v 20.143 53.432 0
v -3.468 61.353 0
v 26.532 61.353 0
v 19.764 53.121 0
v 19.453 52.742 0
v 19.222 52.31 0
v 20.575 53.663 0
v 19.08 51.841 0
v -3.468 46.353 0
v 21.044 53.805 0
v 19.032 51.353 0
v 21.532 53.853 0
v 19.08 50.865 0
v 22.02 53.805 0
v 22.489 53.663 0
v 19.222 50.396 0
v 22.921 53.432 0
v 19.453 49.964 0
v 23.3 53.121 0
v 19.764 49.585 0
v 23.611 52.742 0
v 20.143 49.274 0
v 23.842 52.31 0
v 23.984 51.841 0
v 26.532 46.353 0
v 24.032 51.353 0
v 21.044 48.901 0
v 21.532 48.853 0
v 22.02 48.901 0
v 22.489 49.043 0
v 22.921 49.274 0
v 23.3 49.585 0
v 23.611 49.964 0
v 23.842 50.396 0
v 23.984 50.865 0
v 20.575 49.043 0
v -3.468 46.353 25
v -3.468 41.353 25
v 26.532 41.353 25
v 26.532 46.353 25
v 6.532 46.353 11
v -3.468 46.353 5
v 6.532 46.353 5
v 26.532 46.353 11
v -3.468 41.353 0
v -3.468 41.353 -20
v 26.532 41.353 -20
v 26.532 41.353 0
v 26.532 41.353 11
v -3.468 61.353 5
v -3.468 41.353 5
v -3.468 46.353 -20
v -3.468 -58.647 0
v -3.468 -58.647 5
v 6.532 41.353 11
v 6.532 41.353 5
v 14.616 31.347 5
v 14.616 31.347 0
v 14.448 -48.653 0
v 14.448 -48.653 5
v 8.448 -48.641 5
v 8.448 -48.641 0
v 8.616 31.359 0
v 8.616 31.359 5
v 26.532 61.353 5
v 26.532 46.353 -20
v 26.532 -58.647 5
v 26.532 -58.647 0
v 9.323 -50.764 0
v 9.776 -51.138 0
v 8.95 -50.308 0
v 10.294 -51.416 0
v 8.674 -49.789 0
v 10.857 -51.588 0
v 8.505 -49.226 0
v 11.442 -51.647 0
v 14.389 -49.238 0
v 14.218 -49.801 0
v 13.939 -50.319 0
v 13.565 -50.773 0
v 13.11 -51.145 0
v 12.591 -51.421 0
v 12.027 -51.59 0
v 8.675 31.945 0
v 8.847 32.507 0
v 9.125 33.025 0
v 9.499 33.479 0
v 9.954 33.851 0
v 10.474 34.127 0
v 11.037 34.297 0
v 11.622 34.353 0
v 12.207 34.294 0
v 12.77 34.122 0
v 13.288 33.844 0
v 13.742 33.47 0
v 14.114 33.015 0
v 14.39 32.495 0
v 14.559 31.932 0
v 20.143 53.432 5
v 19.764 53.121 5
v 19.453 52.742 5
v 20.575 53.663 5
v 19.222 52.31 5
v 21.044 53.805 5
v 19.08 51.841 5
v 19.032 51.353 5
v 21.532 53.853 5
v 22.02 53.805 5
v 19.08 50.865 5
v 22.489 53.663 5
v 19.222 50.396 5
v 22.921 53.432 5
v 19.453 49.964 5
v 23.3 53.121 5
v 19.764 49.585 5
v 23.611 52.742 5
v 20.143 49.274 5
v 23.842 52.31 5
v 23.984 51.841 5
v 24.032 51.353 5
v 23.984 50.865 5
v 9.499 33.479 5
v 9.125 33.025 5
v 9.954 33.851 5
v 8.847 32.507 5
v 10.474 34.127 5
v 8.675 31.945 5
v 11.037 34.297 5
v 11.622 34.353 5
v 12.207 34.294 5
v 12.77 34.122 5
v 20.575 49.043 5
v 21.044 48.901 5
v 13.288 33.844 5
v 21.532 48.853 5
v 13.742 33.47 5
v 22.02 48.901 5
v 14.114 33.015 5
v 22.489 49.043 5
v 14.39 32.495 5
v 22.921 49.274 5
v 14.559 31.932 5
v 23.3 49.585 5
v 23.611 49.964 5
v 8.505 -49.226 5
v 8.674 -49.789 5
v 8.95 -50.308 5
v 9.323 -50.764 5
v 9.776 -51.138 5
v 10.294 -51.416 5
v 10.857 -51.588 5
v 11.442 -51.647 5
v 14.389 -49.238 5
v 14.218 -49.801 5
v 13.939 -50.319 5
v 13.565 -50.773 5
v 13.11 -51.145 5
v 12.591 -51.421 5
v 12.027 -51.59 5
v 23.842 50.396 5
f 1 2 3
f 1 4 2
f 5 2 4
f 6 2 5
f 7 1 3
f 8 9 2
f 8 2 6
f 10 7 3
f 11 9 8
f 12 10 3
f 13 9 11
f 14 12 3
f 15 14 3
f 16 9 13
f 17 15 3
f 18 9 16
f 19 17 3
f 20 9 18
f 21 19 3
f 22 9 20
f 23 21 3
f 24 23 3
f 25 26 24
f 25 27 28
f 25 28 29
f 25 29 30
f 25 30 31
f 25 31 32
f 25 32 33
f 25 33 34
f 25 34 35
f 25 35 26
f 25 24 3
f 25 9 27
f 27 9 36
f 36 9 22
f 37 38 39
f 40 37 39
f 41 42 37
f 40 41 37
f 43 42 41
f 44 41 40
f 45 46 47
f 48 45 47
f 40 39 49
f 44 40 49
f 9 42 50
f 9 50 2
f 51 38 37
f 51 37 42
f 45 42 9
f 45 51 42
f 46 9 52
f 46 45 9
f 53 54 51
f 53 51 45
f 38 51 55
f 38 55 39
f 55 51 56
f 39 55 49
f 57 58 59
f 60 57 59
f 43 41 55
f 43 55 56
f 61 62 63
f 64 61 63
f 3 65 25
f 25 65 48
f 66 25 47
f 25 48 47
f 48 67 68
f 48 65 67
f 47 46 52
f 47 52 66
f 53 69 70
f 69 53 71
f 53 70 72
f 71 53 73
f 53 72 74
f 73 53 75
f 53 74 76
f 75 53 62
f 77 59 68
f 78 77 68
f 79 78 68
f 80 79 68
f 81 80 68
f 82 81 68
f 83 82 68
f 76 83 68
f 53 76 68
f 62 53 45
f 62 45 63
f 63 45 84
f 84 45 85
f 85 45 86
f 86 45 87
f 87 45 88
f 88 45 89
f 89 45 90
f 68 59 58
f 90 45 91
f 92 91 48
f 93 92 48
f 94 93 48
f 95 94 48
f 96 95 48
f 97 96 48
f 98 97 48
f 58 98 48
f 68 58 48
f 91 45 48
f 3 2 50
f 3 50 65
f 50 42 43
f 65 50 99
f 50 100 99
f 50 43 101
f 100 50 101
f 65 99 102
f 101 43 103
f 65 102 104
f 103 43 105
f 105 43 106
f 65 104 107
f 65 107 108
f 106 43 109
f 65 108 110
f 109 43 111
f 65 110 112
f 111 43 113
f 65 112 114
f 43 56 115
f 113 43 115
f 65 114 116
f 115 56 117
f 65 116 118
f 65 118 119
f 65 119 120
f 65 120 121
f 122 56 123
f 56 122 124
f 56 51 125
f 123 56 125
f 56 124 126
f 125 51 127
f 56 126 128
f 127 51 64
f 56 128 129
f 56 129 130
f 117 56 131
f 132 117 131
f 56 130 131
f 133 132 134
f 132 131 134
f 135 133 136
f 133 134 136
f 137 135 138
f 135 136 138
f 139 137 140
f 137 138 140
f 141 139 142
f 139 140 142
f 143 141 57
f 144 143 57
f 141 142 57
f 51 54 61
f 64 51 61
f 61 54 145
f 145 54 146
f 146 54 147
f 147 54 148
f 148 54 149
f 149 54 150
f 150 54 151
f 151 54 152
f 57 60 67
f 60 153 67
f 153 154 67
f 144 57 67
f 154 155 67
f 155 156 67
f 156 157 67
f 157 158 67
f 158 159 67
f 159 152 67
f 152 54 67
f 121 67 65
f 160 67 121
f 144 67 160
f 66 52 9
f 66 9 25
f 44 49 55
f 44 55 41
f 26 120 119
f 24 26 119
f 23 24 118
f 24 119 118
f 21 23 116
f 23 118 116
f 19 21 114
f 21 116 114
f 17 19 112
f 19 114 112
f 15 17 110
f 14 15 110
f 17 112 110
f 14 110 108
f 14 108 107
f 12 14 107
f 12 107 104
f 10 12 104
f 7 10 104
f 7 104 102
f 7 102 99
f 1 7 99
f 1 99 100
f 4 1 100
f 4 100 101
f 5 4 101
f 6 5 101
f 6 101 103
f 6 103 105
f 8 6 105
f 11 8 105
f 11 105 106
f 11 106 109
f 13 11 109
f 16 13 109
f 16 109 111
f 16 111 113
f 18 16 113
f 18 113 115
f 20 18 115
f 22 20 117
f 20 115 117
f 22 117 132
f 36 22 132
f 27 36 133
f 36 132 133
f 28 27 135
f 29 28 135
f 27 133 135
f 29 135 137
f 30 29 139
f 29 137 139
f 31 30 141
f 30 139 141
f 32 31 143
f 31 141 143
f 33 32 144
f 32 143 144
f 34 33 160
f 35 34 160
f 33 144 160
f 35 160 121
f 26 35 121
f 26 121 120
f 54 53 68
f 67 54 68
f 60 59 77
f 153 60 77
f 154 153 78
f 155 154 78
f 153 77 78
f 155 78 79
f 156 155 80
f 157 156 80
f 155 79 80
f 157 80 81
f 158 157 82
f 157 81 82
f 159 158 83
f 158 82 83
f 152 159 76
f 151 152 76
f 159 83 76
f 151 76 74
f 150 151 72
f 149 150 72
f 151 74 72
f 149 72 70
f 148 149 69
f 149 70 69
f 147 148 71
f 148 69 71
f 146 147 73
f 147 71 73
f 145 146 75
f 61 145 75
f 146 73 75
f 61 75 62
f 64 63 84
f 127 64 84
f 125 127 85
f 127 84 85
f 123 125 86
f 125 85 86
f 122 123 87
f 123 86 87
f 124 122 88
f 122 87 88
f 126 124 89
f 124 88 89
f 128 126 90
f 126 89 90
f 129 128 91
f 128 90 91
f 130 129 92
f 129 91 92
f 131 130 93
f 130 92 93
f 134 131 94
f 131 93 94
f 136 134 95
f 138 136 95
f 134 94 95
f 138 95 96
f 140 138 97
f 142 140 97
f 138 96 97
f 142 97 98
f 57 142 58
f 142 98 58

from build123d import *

# Parameters (mm, degrees)
SKETCH1_W           = 30
SKETCH1_H           = 100
BOSS_EXTRUDE1_DEPTH = 5
SKETCH2_W           = 30
SKETCH2_H           = 45
BOSS_EXTRUDE2_DEPTH = 5
SKETCH3_W           = 30
SKETCH3_H           = 5
BOSS_EXTRUDE3_DEPTH = 15
SKETCH4_R           = 2.5
CUT_EXTRUDE1_DEPTH  = 8
SKETCH5_W           = 6
SKETCH5_H           = 5
CUT_EXTRUDE2_DEPTH  = 20


with BuildPart() as part:
    # Sketch1 → Boss-Extrude1 (new body)
    with BuildSketch(Plane.XY):
        with Locations((11.532089338, -8.646905221)):
            Rectangle(SKETCH1_W, SKETCH1_H)
        with BuildLine():
            Line((14.615865264, 31.346811585), (14.448313411, -48.653188415))
            ThreePointArc((14.448313411, -48.653188415), (11.442030217, -51.646905221), (8.448313411, -48.640622026))
            Line((8.448313411, -48.640622026), (8.615865264, 31.359377974))
            ThreePointArc((8.615865264, 31.359377974), (11.622148459, 34.353094779), (14.615865264, 31.346811585))
        make_face(mode=Mode.SUBTRACT)
    extrude(amount=BOSS_EXTRUDE1_DEPTH)

    # Sketch2 → Boss-Extrude2 (add)
    with BuildSketch(Plane(origin=(0, 41.353094779, 0), x_dir=(1, 0, 0), z_dir=(0, 1, 0))):
        with Locations((11.532089338, -2.5)):
            Rectangle(SKETCH2_W, SKETCH2_H)
    extrude(amount=BOSS_EXTRUDE2_DEPTH)

    # Sketch3 → Boss-Extrude3 (add)
    with BuildSketch(Plane(origin=(0, 46.353094779, 0), x_dir=(1, 0, 0), z_dir=(0, 1, 0))):
        with Locations((11.532089338, -2.5)):
            Rectangle(SKETCH3_W, SKETCH3_H)
    extrude(amount=BOSS_EXTRUDE3_DEPTH)

    # Sketch4 → Cut-Extrude1 (cut)
    with BuildSketch(Plane.XY.offset(5)):
        with Locations((21.532089338, 51.353094779)):
            Circle(SKETCH4_R)
    extrude(amount=-CUT_EXTRUDE1_DEPTH, mode=Mode.SUBTRACT)

    # Sketch5 → Cut-Extrude2 (cut)
    with BuildSketch(Plane(origin=(26.532089338, 0, 0), x_dir=(0, 0, -1), z_dir=(1, 0, 0))):
        with Locations((-8, 43.853094779)):
            Rectangle(SKETCH5_W, SKETCH5_H)
    extrude(amount=-CUT_EXTRUDE2_DEPTH, mode=Mode.SUBTRACT)


solid = part.part
